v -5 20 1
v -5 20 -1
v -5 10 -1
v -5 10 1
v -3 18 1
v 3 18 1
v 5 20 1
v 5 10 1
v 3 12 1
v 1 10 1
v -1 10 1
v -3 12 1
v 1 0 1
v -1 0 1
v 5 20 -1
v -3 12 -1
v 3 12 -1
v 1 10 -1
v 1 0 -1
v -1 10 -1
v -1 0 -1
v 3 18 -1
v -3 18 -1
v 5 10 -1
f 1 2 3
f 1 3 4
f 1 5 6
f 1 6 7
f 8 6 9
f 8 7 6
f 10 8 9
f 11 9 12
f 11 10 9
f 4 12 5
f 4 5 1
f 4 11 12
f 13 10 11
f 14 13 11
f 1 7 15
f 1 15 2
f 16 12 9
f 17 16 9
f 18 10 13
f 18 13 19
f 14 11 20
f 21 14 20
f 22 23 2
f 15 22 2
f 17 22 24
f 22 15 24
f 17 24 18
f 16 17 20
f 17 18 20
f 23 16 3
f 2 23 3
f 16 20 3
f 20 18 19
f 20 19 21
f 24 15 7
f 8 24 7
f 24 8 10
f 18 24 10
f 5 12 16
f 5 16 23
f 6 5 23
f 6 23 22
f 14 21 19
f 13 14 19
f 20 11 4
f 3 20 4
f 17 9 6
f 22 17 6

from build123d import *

# Parameters (mm, degrees)
SKETCH1_W           = 2
SKETCH1_H           = 2
BOSS_EXTRUDE1_DEPTH = 10
SKETCH2_W           = 10
SKETCH2_H           = 2
BOSS_EXTRUDE2_DEPTH = 10
SKETCH3_W           = 6
SKETCH3_H           = 6
CUT_EXTRUDE1_DEPTH  = 21.712315177


with BuildPart() as part:
    # Sketch1 → Boss-Extrude1 (new body)
    with BuildSketch(Plane(origin=(0, 0, 0), x_dir=(1, 0, 0), z_dir=(0, 1, 0))):
        Rectangle(SKETCH1_W, SKETCH1_H)
    extrude(amount=BOSS_EXTRUDE1_DEPTH)

    # Sketch2 → Boss-Extrude2 (add)
    with BuildSketch(Plane(origin=(0, 10, 0), x_dir=(-1, 0, 0), z_dir=(0, 1, 0))):
        Rectangle(SKETCH2_W, SKETCH2_H)
    extrude(amount=BOSS_EXTRUDE2_DEPTH)

    # Sketch3 → Cut-Extrude1 (cut, through all)
    with BuildSketch(Plane.XY.offset(1)):
        with Locations((0, 15)):
            Rectangle(SKETCH3_W, SKETCH3_H)
    extrude(amount=-CUT_EXTRUDE1_DEPTH, mode=Mode.SUBTRACT)


solid = part.part
